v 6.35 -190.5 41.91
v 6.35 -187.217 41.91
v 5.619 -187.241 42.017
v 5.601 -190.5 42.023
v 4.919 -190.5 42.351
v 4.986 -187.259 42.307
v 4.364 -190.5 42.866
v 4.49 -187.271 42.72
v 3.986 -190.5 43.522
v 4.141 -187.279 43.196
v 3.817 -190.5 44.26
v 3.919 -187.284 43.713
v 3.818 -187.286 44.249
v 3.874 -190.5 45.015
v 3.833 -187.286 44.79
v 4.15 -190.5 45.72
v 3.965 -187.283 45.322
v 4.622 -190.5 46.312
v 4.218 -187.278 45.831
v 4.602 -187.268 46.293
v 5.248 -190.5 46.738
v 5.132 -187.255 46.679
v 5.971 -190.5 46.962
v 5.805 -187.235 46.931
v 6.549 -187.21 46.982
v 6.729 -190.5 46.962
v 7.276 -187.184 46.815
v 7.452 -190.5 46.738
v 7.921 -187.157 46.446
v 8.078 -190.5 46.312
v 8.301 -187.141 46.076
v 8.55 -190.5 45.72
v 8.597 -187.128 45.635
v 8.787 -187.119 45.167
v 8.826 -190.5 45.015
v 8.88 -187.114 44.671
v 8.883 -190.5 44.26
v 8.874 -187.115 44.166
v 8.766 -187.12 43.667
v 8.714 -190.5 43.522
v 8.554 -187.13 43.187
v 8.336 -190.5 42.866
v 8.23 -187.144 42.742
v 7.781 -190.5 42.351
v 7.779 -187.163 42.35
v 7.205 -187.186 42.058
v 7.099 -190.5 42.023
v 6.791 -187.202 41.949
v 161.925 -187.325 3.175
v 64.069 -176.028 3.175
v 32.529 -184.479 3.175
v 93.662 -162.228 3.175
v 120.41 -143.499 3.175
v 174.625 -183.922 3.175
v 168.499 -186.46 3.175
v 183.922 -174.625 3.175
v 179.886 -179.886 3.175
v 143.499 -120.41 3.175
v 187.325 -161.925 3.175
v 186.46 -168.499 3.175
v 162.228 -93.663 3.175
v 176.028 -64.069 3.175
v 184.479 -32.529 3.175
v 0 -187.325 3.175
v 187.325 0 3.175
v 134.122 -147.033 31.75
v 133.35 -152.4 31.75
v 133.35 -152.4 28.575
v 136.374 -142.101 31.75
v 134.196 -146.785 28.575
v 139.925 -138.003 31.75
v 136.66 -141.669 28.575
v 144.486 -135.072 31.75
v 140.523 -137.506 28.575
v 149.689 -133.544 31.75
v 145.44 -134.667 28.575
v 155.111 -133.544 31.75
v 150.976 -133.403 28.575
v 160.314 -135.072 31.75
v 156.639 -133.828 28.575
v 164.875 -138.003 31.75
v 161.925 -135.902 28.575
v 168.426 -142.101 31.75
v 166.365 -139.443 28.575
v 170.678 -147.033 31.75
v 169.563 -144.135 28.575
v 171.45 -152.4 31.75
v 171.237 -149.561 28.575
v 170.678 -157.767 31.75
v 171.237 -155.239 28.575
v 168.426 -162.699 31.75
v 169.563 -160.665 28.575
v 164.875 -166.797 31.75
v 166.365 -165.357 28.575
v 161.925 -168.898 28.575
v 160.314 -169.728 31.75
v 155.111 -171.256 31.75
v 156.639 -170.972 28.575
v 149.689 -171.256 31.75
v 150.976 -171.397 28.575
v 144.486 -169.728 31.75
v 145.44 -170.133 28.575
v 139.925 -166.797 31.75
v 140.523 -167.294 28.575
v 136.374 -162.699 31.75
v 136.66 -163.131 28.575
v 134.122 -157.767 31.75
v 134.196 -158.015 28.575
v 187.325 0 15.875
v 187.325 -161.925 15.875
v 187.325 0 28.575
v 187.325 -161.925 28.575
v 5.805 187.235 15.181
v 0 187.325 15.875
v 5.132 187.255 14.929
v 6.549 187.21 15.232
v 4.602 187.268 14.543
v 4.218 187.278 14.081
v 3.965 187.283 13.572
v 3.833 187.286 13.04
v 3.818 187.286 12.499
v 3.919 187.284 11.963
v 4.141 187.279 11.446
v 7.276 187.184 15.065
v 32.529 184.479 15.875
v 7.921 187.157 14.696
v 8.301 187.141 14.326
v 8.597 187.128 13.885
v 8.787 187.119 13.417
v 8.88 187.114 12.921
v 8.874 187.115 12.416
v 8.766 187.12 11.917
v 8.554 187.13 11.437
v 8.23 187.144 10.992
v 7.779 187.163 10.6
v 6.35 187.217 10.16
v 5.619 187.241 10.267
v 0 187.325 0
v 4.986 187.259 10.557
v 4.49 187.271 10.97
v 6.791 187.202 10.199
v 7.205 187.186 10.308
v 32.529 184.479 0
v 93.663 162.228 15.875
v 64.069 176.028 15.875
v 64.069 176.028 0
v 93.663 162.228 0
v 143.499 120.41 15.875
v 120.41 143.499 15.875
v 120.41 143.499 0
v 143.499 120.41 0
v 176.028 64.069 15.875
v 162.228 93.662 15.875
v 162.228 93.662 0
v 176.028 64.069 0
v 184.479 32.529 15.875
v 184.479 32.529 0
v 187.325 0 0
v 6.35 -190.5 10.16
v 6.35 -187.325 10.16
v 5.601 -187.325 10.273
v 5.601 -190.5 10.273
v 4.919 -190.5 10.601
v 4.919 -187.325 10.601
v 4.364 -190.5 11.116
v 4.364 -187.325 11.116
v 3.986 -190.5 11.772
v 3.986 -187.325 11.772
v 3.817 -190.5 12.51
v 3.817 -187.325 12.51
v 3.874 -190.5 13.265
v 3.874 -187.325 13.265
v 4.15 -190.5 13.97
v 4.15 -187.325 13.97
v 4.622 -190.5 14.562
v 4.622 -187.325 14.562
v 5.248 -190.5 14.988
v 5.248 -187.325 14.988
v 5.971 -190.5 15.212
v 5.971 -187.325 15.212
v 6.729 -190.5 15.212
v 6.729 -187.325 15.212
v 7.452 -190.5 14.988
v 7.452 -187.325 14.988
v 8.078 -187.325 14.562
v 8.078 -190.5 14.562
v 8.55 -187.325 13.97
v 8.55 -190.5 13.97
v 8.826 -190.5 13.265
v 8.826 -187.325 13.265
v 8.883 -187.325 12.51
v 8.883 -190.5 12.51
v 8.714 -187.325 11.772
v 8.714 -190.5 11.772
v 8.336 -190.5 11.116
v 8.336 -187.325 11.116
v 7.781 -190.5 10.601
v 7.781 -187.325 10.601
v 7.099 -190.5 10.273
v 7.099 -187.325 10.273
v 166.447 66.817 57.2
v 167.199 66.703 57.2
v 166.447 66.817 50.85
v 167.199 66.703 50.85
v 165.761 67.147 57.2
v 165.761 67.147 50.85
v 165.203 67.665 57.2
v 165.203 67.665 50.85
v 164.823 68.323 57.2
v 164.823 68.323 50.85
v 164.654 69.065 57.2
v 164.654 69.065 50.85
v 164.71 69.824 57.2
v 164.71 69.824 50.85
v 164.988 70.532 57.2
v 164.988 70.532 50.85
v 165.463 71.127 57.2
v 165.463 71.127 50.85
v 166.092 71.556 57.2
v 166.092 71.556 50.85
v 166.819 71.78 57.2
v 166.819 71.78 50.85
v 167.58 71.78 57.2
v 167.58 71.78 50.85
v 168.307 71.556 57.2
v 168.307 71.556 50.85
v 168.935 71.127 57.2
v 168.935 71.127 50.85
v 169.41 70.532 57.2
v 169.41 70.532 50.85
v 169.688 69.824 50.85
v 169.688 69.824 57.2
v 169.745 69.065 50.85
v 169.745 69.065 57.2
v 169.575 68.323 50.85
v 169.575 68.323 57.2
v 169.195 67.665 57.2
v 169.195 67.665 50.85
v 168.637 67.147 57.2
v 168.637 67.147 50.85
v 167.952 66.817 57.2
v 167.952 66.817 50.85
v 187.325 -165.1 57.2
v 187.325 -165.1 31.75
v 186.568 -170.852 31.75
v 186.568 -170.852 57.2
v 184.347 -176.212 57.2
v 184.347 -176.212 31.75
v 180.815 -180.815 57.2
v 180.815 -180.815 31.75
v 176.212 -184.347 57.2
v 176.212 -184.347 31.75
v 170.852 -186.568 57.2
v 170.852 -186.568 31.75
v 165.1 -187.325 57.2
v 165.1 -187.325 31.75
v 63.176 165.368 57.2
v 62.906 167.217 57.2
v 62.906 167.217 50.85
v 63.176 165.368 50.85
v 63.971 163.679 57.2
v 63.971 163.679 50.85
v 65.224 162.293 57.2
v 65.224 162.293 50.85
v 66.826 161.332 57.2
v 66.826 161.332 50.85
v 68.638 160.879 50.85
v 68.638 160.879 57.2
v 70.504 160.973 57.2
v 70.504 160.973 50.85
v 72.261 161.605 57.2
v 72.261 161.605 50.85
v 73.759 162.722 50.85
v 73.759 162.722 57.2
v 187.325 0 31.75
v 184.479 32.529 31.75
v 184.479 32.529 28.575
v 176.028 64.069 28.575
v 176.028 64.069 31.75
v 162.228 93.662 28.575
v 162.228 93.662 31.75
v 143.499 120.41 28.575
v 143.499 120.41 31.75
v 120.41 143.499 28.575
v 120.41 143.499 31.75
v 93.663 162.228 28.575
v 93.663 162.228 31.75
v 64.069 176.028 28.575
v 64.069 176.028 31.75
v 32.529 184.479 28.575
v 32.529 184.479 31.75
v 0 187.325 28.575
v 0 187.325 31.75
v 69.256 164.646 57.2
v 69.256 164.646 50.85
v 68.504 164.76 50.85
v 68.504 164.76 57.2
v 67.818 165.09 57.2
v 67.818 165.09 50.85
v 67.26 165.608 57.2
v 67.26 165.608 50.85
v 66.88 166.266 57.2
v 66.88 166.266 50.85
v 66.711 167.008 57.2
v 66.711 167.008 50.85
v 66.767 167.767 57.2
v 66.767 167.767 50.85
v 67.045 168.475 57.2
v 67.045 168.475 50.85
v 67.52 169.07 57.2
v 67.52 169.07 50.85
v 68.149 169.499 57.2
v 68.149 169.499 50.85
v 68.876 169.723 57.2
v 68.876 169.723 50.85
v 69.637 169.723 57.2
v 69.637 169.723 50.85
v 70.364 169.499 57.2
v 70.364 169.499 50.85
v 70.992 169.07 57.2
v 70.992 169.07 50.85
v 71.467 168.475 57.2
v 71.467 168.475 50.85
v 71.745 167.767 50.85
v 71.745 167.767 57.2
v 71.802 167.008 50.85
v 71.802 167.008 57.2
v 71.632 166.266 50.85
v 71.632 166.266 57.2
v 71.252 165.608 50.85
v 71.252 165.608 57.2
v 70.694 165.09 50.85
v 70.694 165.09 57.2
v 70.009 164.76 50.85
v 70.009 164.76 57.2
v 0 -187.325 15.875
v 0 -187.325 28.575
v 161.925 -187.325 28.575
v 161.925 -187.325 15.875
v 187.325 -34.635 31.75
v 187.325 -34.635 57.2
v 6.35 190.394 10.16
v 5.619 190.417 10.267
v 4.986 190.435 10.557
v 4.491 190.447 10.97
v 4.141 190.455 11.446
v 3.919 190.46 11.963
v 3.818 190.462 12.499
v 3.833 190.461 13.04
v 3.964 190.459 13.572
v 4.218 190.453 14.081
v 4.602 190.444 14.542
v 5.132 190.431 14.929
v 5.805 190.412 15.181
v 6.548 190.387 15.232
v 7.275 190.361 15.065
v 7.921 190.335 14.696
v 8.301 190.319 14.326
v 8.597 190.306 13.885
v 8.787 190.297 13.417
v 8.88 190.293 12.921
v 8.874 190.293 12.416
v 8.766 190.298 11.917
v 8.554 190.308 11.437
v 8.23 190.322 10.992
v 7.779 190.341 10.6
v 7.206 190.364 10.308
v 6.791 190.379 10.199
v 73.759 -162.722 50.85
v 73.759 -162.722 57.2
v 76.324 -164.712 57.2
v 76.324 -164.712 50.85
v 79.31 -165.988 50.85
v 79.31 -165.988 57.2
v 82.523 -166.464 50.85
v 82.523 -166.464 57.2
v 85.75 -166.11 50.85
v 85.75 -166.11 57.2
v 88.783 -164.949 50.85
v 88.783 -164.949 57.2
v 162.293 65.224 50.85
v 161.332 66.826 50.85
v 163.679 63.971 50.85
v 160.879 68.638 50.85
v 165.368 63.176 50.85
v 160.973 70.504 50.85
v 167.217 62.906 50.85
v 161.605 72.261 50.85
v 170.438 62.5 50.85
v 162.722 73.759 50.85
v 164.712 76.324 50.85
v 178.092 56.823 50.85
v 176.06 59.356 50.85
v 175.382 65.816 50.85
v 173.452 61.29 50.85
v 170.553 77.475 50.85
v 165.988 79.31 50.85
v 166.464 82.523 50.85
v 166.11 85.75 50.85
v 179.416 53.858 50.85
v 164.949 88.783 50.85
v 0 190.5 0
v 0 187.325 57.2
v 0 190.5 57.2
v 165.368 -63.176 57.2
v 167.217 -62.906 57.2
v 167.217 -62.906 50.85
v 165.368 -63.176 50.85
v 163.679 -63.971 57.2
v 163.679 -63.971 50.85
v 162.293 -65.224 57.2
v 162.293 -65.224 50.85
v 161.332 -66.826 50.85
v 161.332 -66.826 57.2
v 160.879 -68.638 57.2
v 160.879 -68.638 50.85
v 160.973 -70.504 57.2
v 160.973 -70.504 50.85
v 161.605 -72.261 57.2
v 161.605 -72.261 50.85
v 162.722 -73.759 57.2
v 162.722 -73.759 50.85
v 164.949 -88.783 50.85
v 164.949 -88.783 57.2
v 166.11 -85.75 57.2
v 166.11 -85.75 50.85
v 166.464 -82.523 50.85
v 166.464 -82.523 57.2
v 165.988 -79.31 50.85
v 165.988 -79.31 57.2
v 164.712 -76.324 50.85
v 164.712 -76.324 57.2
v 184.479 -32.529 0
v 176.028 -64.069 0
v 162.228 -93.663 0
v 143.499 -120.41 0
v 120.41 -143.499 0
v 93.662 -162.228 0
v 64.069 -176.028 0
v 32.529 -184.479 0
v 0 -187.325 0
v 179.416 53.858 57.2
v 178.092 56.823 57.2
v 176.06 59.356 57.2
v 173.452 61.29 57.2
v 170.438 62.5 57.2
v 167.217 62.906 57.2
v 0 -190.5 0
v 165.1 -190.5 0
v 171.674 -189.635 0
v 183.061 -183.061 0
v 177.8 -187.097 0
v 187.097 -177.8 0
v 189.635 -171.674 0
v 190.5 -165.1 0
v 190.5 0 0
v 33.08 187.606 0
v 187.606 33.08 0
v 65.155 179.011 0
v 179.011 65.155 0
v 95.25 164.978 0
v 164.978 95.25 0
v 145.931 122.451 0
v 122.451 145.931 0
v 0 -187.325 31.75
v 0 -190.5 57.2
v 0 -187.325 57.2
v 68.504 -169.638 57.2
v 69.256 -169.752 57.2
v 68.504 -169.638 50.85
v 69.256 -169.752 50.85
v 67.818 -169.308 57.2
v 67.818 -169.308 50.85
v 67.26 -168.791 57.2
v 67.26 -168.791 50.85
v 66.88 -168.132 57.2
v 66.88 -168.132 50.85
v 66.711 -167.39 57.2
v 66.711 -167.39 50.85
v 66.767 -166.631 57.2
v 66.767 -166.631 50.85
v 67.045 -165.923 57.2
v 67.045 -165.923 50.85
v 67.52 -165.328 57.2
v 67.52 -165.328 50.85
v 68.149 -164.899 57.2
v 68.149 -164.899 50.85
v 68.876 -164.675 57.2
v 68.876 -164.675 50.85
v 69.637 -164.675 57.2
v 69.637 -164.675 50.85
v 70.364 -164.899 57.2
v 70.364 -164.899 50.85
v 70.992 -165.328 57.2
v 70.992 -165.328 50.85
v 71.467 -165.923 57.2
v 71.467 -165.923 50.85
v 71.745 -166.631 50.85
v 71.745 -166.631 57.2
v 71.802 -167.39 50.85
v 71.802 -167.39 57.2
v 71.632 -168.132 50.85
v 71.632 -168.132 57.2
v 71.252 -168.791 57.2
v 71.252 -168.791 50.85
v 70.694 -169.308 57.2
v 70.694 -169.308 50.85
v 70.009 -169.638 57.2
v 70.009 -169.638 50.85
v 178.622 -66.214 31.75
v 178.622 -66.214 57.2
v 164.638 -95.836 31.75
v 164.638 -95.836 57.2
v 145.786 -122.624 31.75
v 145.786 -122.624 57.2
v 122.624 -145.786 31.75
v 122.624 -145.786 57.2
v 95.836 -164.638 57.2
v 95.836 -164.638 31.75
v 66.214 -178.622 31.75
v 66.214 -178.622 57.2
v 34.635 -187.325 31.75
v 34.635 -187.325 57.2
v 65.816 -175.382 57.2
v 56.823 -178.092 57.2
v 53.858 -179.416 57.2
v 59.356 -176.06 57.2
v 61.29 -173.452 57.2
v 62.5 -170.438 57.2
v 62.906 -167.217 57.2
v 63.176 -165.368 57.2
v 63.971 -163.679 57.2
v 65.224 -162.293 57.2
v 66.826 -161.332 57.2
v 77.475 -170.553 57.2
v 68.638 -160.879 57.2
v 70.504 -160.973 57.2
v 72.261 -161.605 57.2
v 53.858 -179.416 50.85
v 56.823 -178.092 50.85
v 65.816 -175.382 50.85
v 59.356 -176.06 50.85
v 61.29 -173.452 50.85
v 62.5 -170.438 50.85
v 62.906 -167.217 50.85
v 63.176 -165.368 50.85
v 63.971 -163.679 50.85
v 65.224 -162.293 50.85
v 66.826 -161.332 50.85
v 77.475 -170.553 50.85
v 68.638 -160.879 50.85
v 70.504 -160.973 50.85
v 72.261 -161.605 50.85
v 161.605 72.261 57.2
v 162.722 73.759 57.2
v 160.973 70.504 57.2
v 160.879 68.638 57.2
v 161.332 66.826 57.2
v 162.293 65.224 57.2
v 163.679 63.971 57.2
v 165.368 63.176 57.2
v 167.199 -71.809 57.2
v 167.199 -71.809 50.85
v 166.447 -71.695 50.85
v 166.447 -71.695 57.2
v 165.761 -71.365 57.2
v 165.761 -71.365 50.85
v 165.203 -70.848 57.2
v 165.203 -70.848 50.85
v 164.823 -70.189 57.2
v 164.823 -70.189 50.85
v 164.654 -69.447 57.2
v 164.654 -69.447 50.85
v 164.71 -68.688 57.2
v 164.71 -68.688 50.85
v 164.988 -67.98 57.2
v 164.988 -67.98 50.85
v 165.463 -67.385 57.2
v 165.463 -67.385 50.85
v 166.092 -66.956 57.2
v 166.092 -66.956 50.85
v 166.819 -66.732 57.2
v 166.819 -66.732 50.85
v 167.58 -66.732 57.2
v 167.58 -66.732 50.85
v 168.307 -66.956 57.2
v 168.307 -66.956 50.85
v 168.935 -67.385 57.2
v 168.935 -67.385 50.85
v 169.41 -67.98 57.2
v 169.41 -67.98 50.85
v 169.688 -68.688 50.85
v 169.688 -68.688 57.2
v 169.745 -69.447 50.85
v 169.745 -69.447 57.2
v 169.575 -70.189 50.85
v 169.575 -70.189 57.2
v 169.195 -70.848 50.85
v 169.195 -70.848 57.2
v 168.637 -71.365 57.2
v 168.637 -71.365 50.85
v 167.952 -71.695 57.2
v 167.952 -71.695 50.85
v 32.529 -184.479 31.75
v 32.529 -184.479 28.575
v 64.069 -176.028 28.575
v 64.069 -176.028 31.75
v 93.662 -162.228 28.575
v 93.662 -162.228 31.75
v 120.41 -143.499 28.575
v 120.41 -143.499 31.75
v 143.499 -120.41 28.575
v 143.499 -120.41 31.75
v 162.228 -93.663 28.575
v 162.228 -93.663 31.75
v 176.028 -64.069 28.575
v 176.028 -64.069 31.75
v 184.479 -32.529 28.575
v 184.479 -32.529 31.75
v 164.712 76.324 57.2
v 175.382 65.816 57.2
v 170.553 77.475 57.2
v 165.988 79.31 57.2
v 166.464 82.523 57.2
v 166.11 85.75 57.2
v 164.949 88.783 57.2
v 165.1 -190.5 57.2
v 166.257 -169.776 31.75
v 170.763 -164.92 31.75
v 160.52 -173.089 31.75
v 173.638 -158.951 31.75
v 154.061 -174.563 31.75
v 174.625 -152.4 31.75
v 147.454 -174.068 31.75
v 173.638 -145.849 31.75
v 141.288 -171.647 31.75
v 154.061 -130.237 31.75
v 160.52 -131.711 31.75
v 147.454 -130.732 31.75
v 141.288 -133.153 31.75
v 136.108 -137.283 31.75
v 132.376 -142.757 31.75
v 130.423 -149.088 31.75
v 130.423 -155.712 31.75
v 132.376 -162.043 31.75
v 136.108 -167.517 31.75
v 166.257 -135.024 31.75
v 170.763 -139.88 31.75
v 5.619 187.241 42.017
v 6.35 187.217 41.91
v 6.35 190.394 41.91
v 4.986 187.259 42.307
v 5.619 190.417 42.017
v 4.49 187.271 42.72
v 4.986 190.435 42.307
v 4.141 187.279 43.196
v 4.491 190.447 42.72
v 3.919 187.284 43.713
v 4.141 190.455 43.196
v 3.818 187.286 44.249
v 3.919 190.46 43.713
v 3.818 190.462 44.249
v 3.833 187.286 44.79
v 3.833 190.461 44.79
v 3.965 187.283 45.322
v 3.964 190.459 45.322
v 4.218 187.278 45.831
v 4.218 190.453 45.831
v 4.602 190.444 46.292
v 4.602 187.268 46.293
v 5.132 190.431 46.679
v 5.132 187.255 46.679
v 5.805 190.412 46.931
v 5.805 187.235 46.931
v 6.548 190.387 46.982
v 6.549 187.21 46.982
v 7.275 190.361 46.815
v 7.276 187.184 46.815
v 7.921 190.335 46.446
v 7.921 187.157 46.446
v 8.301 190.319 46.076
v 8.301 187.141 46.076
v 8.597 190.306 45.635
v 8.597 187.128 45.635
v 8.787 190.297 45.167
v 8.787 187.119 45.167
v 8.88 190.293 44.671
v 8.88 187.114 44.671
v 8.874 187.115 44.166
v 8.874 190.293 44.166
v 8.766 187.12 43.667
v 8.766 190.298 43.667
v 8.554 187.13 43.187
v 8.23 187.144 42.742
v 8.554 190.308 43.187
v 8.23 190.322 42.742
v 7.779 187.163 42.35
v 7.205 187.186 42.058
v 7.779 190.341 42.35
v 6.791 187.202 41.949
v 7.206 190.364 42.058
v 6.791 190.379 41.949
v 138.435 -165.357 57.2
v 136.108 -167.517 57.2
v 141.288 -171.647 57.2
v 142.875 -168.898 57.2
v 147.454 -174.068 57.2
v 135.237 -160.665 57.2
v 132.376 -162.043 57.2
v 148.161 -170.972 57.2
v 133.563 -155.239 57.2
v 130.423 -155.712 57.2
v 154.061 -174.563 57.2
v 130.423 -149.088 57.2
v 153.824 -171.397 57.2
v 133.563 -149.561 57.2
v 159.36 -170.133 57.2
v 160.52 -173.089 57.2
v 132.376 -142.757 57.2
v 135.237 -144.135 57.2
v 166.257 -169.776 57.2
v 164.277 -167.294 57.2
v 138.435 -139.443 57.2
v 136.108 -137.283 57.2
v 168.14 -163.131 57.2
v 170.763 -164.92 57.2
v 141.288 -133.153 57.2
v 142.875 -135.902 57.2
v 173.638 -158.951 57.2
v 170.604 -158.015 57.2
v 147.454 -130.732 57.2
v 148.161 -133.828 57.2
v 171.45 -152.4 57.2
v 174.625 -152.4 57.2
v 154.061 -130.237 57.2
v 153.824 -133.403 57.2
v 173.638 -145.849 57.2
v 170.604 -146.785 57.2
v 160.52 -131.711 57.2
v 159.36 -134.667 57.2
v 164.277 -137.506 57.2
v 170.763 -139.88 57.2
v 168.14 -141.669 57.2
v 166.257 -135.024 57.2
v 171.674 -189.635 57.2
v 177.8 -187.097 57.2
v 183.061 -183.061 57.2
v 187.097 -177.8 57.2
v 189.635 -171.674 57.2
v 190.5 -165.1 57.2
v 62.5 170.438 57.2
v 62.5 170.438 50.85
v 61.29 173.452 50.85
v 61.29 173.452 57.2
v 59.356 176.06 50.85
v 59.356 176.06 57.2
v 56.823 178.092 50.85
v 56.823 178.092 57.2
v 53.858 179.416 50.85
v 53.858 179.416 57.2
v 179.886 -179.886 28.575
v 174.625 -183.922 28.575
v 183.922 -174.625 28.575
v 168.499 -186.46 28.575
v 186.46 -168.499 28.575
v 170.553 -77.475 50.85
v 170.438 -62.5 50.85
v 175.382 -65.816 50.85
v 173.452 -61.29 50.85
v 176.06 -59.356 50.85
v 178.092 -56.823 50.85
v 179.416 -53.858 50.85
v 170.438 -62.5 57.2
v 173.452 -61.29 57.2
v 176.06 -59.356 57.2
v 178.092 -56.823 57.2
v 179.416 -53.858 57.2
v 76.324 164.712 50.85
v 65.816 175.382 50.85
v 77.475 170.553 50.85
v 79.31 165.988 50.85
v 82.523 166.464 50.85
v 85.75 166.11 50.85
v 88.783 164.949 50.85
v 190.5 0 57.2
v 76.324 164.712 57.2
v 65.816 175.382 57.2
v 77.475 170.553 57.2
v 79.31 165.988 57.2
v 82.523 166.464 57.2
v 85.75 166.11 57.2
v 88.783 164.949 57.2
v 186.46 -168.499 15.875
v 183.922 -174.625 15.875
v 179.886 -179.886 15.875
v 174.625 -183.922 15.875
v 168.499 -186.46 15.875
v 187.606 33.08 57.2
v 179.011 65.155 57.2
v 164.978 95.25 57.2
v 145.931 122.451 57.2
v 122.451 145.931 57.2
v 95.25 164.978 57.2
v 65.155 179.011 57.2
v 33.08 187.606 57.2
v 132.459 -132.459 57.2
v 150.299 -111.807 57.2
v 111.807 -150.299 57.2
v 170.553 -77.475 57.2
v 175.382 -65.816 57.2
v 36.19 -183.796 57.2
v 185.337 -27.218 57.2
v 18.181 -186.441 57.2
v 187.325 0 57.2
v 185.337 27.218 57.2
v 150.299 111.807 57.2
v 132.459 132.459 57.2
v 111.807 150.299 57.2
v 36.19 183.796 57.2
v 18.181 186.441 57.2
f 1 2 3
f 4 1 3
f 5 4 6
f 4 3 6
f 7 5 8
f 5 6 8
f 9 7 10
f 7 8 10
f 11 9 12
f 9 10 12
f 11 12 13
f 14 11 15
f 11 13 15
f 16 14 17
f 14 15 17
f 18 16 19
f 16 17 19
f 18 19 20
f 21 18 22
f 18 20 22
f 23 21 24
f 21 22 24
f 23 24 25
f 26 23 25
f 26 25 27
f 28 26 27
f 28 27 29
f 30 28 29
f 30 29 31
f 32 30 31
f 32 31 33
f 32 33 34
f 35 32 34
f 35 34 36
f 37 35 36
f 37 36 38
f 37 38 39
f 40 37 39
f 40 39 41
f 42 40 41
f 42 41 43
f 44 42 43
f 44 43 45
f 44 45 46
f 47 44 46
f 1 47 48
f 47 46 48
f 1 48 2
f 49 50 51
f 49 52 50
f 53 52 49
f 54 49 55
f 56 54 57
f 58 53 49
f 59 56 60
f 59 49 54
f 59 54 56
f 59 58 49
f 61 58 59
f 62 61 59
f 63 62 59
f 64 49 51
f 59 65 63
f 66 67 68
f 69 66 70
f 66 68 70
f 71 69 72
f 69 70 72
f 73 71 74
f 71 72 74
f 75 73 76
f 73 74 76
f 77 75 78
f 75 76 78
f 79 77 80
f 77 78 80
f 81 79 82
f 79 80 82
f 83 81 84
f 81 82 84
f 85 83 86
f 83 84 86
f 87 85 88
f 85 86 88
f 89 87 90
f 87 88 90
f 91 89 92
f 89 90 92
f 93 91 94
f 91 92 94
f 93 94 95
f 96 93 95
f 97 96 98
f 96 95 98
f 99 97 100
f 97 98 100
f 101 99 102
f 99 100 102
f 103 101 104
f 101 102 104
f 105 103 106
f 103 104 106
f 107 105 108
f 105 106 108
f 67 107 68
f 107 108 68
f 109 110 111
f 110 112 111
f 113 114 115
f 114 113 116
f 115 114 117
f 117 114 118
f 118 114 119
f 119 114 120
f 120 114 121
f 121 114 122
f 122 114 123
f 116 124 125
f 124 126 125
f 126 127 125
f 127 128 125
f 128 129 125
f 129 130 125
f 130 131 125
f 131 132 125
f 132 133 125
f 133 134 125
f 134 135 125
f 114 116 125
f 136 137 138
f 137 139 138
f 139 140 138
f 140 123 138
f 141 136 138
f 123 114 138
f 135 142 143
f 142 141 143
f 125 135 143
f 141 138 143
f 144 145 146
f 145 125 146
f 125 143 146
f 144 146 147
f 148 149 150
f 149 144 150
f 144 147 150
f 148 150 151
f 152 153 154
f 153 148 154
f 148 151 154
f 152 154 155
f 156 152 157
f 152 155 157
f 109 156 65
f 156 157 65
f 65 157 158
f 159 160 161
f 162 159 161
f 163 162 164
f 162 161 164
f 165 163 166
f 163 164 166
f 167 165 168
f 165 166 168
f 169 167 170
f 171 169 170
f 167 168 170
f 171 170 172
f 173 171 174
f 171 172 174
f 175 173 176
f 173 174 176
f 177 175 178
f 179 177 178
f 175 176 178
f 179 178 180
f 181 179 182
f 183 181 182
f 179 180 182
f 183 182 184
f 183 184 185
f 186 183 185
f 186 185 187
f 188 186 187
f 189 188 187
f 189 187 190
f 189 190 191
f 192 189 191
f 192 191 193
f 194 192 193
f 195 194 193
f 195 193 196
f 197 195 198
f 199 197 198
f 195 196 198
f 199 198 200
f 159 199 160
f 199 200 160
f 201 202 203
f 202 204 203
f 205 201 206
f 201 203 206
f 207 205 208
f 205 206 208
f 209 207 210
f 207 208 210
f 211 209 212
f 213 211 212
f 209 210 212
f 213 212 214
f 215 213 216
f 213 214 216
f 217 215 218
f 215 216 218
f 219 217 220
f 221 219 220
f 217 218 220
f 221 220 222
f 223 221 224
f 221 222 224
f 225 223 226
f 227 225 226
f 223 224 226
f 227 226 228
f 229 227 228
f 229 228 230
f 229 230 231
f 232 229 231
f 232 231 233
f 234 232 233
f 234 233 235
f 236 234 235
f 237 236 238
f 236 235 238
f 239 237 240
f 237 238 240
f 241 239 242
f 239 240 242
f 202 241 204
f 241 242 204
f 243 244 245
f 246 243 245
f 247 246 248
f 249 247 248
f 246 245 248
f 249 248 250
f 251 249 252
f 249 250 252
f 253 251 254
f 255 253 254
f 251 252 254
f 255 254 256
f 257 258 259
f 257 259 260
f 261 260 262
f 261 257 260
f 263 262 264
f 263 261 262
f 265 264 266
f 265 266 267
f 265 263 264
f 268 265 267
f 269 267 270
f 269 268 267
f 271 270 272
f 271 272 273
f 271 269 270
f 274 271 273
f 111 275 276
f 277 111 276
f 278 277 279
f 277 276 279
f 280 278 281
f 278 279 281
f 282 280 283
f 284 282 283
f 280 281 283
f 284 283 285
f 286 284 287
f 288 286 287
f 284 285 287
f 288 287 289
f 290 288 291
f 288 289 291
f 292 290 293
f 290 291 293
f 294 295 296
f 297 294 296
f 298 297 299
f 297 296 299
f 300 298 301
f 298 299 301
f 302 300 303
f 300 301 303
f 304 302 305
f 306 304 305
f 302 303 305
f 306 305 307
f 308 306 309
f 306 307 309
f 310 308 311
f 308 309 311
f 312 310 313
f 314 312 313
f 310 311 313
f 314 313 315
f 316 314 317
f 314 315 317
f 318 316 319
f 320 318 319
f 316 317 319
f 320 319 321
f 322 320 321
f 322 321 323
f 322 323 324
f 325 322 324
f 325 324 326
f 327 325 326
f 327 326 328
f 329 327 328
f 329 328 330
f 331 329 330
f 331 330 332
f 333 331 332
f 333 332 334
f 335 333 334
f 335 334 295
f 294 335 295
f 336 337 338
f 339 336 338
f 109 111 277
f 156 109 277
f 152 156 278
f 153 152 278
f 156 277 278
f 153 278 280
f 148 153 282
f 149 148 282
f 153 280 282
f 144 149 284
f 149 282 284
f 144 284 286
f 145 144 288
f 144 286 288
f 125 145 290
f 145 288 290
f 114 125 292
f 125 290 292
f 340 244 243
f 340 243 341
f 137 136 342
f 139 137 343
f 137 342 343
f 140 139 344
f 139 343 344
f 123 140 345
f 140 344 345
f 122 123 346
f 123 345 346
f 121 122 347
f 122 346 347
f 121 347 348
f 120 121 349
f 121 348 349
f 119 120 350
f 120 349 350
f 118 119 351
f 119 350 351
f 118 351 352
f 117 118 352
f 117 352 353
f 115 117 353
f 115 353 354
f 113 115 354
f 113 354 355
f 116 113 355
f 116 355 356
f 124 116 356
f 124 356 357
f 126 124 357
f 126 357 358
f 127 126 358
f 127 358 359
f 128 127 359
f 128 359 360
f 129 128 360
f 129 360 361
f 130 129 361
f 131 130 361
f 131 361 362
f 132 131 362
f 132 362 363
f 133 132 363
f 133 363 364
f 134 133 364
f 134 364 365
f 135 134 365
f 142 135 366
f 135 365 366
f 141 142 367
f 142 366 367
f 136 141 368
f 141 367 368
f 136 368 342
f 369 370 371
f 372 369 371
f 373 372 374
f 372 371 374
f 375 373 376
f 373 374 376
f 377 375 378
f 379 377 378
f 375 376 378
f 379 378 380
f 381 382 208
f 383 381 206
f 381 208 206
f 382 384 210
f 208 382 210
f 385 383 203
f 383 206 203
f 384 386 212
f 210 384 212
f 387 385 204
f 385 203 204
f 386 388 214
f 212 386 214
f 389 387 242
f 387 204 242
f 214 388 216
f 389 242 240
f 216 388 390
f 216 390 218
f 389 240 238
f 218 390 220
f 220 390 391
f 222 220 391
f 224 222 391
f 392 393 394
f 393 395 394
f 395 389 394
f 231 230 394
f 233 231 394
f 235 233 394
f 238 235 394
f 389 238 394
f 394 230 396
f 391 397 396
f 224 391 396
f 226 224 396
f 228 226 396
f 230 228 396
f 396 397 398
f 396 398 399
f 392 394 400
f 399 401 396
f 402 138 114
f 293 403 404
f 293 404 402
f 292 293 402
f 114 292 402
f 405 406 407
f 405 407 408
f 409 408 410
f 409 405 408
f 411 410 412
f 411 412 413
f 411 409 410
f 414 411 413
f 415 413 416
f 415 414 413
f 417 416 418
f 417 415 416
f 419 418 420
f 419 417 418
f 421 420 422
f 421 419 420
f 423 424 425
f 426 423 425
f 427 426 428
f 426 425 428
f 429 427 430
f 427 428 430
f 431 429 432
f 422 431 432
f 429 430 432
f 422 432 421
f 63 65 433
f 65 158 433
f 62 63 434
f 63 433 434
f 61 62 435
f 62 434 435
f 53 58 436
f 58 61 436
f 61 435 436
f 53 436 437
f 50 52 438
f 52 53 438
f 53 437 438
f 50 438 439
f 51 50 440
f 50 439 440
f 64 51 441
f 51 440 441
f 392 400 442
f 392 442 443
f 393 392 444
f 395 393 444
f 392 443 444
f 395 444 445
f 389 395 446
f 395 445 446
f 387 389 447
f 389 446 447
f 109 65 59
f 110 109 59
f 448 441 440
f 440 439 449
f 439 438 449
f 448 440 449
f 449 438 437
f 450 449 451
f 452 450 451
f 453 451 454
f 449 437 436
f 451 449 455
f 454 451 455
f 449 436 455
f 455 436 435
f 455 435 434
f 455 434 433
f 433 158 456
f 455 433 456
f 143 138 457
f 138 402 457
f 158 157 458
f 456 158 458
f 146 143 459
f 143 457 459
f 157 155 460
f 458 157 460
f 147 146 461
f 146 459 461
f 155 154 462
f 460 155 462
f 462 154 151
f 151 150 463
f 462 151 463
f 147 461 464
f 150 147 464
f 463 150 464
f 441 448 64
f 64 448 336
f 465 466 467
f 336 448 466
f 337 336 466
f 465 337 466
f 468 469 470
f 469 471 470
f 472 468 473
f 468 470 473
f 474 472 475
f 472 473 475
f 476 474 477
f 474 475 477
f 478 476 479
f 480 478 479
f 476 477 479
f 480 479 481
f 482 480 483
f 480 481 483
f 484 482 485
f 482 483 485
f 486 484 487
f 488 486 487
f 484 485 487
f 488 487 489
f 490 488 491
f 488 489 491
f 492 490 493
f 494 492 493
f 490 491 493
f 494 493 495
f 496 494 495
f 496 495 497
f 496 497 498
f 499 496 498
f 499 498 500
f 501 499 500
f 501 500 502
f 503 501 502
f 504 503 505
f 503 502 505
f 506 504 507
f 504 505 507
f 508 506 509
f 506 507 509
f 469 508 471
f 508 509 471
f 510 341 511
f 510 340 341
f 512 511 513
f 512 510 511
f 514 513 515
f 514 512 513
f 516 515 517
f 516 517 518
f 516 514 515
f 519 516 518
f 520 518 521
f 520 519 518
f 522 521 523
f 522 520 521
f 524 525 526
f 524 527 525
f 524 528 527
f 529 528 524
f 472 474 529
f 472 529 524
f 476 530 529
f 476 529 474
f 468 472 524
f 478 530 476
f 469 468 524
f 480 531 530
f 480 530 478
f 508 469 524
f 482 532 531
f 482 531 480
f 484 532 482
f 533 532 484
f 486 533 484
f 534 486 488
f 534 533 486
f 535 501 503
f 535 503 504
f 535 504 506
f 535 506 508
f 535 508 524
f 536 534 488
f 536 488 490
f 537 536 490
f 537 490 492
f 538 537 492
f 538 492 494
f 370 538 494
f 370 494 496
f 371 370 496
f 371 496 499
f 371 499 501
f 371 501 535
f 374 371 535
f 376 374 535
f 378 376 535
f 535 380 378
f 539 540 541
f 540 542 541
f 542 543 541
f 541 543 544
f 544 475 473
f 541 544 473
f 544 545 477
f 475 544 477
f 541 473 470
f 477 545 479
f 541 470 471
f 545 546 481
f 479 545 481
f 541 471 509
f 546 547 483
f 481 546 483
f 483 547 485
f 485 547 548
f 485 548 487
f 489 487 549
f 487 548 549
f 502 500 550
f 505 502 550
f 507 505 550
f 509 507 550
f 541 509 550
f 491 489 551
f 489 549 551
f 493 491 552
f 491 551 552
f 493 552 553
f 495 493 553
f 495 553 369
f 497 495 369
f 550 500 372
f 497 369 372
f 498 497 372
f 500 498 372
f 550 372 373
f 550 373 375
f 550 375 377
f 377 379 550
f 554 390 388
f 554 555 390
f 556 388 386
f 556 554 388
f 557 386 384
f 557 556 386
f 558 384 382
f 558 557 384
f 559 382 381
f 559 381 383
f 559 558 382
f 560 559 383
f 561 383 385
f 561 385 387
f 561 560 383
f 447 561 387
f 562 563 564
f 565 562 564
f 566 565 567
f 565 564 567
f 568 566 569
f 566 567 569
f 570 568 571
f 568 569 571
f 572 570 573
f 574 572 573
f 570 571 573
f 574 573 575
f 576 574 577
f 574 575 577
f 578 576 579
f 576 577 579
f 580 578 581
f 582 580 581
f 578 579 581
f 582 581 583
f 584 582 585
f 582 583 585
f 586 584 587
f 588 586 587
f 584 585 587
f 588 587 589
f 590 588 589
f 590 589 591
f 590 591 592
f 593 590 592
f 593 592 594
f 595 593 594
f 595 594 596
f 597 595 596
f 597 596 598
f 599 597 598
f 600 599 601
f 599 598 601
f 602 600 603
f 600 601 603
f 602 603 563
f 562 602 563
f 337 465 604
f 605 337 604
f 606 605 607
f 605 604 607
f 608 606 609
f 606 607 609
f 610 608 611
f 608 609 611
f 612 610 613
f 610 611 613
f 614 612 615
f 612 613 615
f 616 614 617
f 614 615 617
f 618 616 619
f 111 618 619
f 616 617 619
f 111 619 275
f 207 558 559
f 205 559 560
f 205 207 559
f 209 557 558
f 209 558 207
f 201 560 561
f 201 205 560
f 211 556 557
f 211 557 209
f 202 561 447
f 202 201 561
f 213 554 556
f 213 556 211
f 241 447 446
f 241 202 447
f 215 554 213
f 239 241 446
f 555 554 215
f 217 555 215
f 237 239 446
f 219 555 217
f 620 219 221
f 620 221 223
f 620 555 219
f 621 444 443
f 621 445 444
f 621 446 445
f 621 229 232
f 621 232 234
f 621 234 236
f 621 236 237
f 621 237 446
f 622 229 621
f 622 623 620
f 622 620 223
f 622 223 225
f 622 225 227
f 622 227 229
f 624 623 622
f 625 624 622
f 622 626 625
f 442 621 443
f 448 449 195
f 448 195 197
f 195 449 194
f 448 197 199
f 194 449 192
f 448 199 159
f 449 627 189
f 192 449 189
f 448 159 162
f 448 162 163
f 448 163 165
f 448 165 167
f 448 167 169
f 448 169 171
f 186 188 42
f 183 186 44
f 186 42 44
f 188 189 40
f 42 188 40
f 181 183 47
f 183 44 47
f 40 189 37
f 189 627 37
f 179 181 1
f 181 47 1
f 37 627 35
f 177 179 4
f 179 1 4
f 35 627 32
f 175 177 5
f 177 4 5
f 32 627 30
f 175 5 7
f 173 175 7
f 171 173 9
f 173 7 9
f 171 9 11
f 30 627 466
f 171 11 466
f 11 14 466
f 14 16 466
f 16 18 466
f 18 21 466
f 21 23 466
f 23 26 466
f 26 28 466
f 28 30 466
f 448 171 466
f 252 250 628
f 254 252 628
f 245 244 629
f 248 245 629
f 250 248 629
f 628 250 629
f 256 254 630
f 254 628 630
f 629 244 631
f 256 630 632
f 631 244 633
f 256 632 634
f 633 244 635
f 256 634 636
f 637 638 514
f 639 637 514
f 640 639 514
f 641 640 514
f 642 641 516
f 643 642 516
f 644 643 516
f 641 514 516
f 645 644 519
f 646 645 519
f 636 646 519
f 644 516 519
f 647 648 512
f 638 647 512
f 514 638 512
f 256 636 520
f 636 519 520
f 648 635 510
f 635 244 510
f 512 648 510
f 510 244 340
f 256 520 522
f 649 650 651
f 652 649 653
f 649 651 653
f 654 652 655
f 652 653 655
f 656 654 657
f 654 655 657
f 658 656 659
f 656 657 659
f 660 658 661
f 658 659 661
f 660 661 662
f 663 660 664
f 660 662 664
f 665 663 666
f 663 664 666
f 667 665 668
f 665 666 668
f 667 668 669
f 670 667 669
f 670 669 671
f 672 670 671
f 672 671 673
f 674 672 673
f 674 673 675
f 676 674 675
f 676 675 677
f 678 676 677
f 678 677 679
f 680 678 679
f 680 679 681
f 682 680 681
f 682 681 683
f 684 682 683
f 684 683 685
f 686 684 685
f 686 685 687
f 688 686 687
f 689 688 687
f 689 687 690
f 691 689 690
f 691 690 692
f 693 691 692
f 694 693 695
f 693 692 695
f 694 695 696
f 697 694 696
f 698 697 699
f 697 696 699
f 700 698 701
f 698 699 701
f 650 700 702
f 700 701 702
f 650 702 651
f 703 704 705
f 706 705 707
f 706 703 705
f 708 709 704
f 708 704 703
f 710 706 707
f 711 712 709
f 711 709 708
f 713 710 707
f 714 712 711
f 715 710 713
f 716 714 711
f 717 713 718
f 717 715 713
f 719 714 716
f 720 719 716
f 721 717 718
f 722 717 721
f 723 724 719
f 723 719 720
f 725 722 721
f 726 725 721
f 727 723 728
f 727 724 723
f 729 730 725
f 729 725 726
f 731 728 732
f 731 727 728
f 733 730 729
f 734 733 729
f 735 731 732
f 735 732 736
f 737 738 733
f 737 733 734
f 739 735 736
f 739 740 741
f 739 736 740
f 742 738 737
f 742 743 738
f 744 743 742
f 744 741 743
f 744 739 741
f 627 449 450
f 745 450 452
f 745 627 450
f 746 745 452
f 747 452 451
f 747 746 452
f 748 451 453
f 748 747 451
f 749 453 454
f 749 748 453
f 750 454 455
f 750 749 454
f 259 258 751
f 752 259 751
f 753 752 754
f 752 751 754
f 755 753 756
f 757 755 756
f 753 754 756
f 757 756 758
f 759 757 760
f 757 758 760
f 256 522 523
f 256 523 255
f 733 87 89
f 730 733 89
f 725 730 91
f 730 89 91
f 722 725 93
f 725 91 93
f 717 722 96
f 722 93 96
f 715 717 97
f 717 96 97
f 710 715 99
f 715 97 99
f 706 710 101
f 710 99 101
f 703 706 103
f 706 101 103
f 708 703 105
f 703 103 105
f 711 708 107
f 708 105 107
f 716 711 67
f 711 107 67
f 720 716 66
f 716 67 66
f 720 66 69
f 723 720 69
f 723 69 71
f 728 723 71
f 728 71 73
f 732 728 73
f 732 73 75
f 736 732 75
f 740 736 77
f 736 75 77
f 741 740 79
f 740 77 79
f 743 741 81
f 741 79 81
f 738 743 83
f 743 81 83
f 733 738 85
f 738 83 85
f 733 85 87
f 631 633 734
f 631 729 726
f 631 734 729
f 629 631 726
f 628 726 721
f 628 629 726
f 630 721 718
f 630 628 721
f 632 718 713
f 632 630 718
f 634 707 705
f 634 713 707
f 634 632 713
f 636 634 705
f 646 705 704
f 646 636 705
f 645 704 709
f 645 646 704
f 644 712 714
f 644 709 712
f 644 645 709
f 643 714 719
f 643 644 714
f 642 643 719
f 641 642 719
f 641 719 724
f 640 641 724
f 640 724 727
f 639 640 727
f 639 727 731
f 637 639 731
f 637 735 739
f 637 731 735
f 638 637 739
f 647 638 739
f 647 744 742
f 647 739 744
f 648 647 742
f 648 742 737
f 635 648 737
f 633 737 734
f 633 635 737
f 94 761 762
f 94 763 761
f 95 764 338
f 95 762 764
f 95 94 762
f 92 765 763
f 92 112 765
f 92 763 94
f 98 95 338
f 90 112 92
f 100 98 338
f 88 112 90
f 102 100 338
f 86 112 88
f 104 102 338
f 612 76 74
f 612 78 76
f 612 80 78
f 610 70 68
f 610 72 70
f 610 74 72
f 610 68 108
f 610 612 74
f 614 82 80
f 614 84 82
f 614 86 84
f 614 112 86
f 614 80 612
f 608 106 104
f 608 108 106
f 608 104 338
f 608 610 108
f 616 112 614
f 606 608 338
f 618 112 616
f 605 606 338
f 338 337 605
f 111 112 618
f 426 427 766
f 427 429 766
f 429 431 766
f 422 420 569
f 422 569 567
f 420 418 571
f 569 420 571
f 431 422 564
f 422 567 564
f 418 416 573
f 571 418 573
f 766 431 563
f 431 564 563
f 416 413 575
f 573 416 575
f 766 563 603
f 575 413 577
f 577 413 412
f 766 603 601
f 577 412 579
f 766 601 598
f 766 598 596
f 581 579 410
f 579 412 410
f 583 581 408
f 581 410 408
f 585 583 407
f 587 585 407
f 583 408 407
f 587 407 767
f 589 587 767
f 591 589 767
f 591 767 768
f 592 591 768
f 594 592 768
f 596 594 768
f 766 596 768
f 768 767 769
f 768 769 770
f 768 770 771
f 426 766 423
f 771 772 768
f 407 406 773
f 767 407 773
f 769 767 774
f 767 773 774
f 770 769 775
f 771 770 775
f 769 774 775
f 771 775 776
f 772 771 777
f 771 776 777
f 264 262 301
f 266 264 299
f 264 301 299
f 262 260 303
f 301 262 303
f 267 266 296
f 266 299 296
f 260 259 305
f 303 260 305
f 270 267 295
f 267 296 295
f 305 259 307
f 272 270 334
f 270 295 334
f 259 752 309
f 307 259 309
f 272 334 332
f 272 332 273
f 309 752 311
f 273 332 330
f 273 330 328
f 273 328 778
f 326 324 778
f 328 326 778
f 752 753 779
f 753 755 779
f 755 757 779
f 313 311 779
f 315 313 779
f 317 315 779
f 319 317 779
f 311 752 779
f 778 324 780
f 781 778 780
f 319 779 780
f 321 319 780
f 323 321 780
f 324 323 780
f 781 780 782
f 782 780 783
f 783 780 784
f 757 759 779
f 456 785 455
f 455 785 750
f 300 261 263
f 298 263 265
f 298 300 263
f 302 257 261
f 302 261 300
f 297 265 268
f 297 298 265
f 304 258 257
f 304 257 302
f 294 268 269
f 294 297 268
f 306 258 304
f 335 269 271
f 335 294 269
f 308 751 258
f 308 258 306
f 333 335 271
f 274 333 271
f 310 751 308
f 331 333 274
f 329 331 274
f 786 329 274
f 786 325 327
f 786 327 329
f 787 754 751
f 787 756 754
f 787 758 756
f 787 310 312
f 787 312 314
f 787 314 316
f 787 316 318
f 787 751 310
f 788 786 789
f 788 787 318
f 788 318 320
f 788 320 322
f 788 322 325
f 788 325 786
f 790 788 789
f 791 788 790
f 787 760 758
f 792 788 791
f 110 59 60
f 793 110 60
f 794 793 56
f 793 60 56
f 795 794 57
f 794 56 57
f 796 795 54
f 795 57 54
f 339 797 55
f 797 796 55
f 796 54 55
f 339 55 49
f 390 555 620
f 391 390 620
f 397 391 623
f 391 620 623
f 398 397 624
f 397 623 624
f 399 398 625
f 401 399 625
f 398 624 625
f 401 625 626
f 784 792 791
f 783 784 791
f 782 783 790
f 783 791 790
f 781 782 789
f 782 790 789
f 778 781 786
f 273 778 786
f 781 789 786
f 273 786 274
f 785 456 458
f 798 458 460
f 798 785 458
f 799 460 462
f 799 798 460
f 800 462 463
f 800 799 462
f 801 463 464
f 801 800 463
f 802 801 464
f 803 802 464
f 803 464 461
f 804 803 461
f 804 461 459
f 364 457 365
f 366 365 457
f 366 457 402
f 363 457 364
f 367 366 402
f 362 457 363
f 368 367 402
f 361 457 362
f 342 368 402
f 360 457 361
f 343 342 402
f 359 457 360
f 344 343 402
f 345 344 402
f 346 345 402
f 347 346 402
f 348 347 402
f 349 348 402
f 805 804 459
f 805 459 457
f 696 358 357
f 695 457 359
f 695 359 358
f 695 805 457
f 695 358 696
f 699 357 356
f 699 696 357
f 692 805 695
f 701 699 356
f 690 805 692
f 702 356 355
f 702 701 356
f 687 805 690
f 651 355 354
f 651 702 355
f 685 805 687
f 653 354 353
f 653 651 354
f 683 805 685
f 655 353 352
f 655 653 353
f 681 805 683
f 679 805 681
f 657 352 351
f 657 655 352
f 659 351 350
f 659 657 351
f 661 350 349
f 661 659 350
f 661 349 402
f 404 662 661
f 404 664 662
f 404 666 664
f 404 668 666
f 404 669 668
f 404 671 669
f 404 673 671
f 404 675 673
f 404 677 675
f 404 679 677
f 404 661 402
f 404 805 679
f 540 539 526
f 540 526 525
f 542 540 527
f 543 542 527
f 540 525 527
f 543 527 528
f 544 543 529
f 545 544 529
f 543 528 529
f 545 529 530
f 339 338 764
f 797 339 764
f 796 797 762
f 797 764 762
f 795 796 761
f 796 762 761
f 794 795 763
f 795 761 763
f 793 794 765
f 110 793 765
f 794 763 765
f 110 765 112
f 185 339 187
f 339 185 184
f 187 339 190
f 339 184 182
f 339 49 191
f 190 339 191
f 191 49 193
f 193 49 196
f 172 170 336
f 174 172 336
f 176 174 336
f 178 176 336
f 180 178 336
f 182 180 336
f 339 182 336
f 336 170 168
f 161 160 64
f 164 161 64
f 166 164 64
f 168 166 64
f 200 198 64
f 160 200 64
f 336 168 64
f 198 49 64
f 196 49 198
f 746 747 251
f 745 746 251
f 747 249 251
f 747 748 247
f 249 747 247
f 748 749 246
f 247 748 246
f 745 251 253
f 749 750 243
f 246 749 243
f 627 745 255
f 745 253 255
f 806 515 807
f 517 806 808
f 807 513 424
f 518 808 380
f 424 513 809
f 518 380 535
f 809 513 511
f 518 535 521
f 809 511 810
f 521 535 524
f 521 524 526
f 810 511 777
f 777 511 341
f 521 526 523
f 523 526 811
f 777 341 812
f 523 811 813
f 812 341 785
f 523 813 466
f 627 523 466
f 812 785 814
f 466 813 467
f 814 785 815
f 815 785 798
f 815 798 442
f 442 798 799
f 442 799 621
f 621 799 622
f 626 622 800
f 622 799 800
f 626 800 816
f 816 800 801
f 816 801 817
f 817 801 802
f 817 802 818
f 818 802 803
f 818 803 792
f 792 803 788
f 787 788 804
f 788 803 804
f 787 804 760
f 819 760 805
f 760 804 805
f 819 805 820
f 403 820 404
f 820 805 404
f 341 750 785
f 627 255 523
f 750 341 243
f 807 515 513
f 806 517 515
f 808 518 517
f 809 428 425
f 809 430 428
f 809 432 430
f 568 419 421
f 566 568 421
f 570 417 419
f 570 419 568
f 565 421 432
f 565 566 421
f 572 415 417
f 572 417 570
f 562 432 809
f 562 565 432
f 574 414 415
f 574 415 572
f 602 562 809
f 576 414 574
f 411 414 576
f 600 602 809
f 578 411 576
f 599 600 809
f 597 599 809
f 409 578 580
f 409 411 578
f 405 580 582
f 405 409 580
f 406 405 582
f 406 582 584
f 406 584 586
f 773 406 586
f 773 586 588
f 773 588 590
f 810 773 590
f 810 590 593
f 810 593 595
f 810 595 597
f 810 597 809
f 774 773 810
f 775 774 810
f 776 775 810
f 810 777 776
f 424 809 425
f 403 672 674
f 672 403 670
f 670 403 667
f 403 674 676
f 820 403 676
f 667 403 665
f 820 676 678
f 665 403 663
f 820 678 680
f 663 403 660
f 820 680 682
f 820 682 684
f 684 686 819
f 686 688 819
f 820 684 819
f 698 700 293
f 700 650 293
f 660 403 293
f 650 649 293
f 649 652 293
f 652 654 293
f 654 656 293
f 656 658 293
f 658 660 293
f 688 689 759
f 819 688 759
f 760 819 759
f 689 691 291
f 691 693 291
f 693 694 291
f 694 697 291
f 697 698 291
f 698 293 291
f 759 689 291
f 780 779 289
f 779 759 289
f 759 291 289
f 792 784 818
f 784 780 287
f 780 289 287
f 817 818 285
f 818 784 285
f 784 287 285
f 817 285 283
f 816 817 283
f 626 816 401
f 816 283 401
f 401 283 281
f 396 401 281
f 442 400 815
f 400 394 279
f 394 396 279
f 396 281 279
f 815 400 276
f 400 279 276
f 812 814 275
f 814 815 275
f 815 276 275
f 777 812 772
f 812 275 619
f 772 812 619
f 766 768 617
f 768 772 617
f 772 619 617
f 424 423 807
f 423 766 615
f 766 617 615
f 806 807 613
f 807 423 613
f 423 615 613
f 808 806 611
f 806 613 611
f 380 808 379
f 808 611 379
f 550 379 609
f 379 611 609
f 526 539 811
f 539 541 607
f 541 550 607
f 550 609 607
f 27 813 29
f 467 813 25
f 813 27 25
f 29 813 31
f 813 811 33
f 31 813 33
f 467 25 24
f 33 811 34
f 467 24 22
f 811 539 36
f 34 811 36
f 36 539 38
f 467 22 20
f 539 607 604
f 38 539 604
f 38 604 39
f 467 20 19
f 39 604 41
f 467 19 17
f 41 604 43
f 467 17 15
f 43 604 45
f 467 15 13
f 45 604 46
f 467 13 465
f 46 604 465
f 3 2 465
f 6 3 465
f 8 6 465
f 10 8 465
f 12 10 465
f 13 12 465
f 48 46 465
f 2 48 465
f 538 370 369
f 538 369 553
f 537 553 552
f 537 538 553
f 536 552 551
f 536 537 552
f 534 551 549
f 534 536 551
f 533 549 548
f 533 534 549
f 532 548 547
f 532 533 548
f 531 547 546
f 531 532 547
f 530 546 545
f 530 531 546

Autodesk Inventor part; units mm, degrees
ref_plane "YZ Plane" through (0, 0, 0) normal (1, 0, 0) x (0, 1, 0)
ref_plane "XZ Plane" through (0, 0, 0) normal (0, 1, 0) x (-1, 0, 0)
ref_plane "XY Plane" through (0, 0, 0) normal (0, 0, 1) x (1, 0, 0)
sketch "Sketch1" plane through (0, 0, 0) normal (0, 0, 1) x (1, 0, 0)
  arc A0 (190.5, 0) -> (-190.5, 0) centre (0, 0) ccw
  circle A1 centre (0, 0) radius 187.325
  line L0 (-190.5, 0) -> (-190.5, -165.1)
  line L1 (-165.1, -190.5) -> (165.1, -190.5)
  line L2 (190.5, -165.1) -> (190.5, 0)
  arc A2 (-190.5, -165.1) -> (-165.1, -190.5) centre (-165.1, -165.1) ccw
  arc A3 (165.1, -190.5) -> (190.5, -165.1) centre (165.1, -165.1) ccw
  dimension "d0" = 381
  dimension "d1" = 3.175
  dimension "d2" = 25.4
extrude "Extrusion1" add sketch "Sketch1" along normal blind 3.175
sketch "Sketch2" plane through (0, 0, 3.175) normal (0, 0, 1) x (1, 0, 0)
  line L0 (-190.5, 0) -> (-190.5, -165.1) projected
  arc A0 (-190.5, -165.1) -> (-165.1, -190.5) centre (-165.1, -165.1) ccw projected
  line L1 (-165.1, -190.5) -> (165.1, -190.5) projected
  arc A1 (165.1, -190.5) -> (190.5, -165.1) centre (165.1, -165.1) ccw projected
  line L2 (190.5, -165.1) -> (190.5, 0) projected
  arc A2 (190.5, 0) -> (-190.5, 0) centre (0, 0) ccw projected
  circle A3 centre (0, 0) radius 187.325 projected
  line L3 (-187.325, 0) -> (-187.325, -161.925)
  line L4 (187.325, 0) -> (187.325, -161.925)
  line L5 (161.925, -187.325) -> (-161.925, -187.325)
  circle A4 centre (0, 0) radius 187.325 projected
  arc A5 (-187.325, -161.925) -> (-161.925, -187.325) centre (-161.925, -161.925) ccw
  arc A6 (161.925, -187.325) -> (187.325, -161.925) centre (161.925, -161.925) ccw
  dimension "d5" = 25.4
extrude "Extrusion2" add sketch "Sketch2" along normal blind 12.7
mirror "Mirror1" about plane through (0, 0, 15.875) normal (0, 0, 1) of "Extrusion1", "Extrusion2"
sketch "Sketch3" plane through (0, 0, 31.75) normal (0, 0, 1) x (1, 0, 0)
  point P0 (0, 0)
sketch "Sketch4" plane through (0, 0, 31.75) normal (0, 0, -1) x (-1, 0, 0)
  line L0 (190.5, 0) -> (190.5, -165.1) projected
  arc A0 (190.5, 0) -> (-190.5, 0) centre (0, 0) ccw projected
  line L1 (-190.5, -165.1) -> (-190.5, 0) projected
  arc A1 (-190.5, -165.1) -> (-165.1, -190.5) centre (-165.1, -165.1) ccw projected
  line L2 (165.1, -190.5) -> (-165.1, -190.5) projected
  arc A2 (165.1, -190.5) -> (190.5, -165.1) centre (165.1, -165.1) ccw projected
  circle A3 centre (0, 0) radius 187.325 projected
  arc A4 (-187.325, -165.1) -> (-165.1, -187.325) centre (-165.1, -165.1) ccw
  line L3 (-187.325, -165.1) -> (-187.325, 0)
  arc A5 (187.325, 0) -> (-187.325, 0) centre (0, 0) ccw
  line L4 (187.325, 0) -> (187.325, -165.1)
  arc A6 (165.1, -187.325) -> (187.325, -165.1) centre (165.1, -165.1) ccw
  line L5 (165.1, -187.325) -> (-165.1, -187.325)
  circle A7 centre (0, 0) radius 190.5
  point P0 (-34.6352, -187.325)
  point P1 (-187.325, -34.6352)
  point P2 (34.6352, -187.325)
  point P3 (187.325, -34.6352)
  dimension "d8" = 3.175
  dimension "d9" = 3.175
extrude "Extrusion3" add sketch "Sketch4" against normal blind 25.4504 contours A7 L4 A3 L3 A0 | L0 A2 L2 A7 L5 A6 L4 | A7 L3 A4 L5 L2 A1 L1 | A7 L5 A3 L4 | L3 A3 L5 A7 | A7 L5
sketch "Sketch5" plane through (161.925, -187.325, 28.575) normal (0, 0, -1) x (-1, 0, 0)
  circle A0 centre (9.525, 34.925) radius 19.05
  point P0 (161.925, 187.325)
  dimension "d12" = 38.1
  dimension "d13" = 152.4
  dimension "d14" = 152.4
extrude "Extrusion4" cut sketch "Sketch5" against normal through all
sketch "Sketch6" plane through (34.6352, -187.325, 31.75) normal (0, 0, 1) x (1, 0, 0)
  circle A0 centre (117.7648, 34.925) radius 19.05 projected
  circle A1 centre (117.7648, 34.925) radius 19.05
  circle A2 centre (117.7648, 34.925) radius 22.225
  point P0 (-34.6352, 187.325)
  dimension "d17" = 3.175
extrude "Extrusion5" add sketch "Sketch6" along normal up to surface (25.4504 mm away)
sketch "Sketch7" plane through (0, 0, 0) normal (1, 0, 0) x (0, 1, 0)
  line L0 (-211.2628, -72.6551) -> (211.2628, -72.6551)
  line L1 (211.2628, -72.6551) -> (211.2628, 72.6551)
  line L2 (211.2628, 72.6551) -> (-211.2628, 72.6551)
  line L3 (-211.2628, 72.6551) -> (-211.2628, -72.6551)
  line L4 (-211.2628, -72.6551) -> (211.2628, 72.6551) construction
  line L5 (211.2628, -72.6551) -> (-211.2628, 72.6551) construction
  point P0 (0, 0)
extrude "Extrusion6" cut sketch "Sketch7" against normal through all
sketch "Sketch8" plane through (165.1, -190.5, 0) normal (0, -1, 0) x (1, 0, 0)
  line L0 (-165.1, 0) -> (0, 0) projected
  line L1 (-165.1, 57.2004) -> (-165.1, 0) projected
  point P0 (-158.75, 12.7)
  point P1 (-158.75, 44.45)
  dimension "d22" = 12.7
  dimension "d23" = 31.75
  dimension "d24" = 6.35
hole "Hole1" at (6.35, -190.5, 44.45) at (6.35, -190.5, 12.7) direction (0, 1, 0) diameter 5.08 end through all
sketch "Sketch9" plane through (0, 0, 57.2004) normal (0, 0, 1) x (1, 0, 0)
  arc A0 (0, -187.325) -> (187.325, 0) centre (0, 0) ccw projected
  line L0 (69.2561, -167.1991) -> (0, 0) construction
  line L1 (-45.2243, 0) -> (271.3455, 0) projected
  line L2 (0, 0) -> (0, -221.1499)
  circle A1 centre (69.2561, -167.1991) radius 6.35
  arc A2 (73.7587, -162.7215) -> (66.8261, -161.3325) centre (69.2561, -167.1991) ccw
  arc A3 (66.8261, -161.3325) -> (62.9062, -167.2167) centre (69.2561, -167.1991) ccw
  arc A4 (73.7587, -162.7215) -> (88.7831, -164.9492) centre (82.7639, -153.7662) ccw
  arc A5 (53.8576, -179.4158) -> (62.9062, -167.2167) centre (50.2062, -167.252) ccw
  arc A6 (0, -187.325) -> (0, 187.325) centre (0, 0) ccw projected
  circle A7 centre (167.1991, -69.2561) radius 6.35
  arc A8 (164.9492, -88.7831) -> (162.7215, -73.7587) centre (153.7662, -82.7639) ccw
  arc A9 (167.2167, -62.9062) -> (179.4158, -53.8576) centre (167.252, -50.2062) ccw
  circle A10 centre (167.1991, 69.2561) radius 6.35
  arc A11 (179.4158, 53.8576) -> (167.2167, 62.9062) centre (167.252, 50.2062) ccw
  arc A12 (162.7215, 73.7587) -> (164.9492, 88.7831) centre (153.7662, 82.7639) ccw
  circle A13 centre (69.2561, 167.1991) radius 6.35
  arc A14 (88.7831, 164.9492) -> (73.7587, 162.7215) centre (82.7639, 153.7662) ccw
  arc A15 (62.9062, 167.2167) -> (53.8576, 179.4158) centre (50.2062, 167.252) ccw
  circle A16 centre (-69.2561, 167.1991) radius 6.35
  arc A17 (-53.8576, 179.4158) -> (-62.9062, 167.2167) centre (-50.2062, 167.252) ccw
  arc A18 (-73.7587, 162.7215) -> (-88.7831, 164.9492) centre (-82.7639, 153.7662) ccw
  circle A19 centre (-167.1991, 69.2561) radius 6.35
  arc A20 (-164.9492, 88.7831) -> (-162.7215, 73.7587) centre (-153.7662, 82.7639) ccw
  arc A21 (-167.2167, 62.9062) -> (-179.4158, 53.8576) centre (-167.252, 50.2062) ccw
  circle A22 centre (-167.1991, -69.2561) radius 6.35
  arc A23 (-179.4158, -53.8576) -> (-167.2167, -62.9062) centre (-167.252, -50.2062) ccw
  arc A24 (-162.7215, -73.7587) -> (-164.9492, -88.7831) centre (-153.7662, -82.7639) ccw
  circle A25 centre (-69.2561, -167.1991) radius 6.35
  arc A26 (-88.7831, -164.9492) -> (-73.7587, -162.7215) centre (-82.7639, -153.7662) ccw
  arc A27 (-62.9062, -167.2167) -> (-53.8576, -179.4158) centre (-50.2062, -167.252) ccw
  point P0 (161.3325, -66.8261)
  point P1 (161.3325, 66.8261)
  point P2 (66.8261, 161.3325)
  point P3 (-66.8261, 161.3325)
  point P4 (-161.3325, 66.8261)
  point P5 (-161.3325, -66.8261)
  point P6 (-66.8261, -161.3325)
  point P7 (179.4158, -53.8576)
  dimension "d32" = 180.975
  dimension "d38" = 12.7
  dimension "d39" = 67.5
  dimension "d40" = 12.7
  dimension "d43" = 360
extrude "Extrusion7" add sketch "Sketch9" against normal blind 6.35 contours A14 A13 A6 | A11 A10 A6 | A5 A1 A0 | A1 A4 A0 | A1 | A0 A7 A9 | A8 A7 A0 | A7 | A10 A12 A6 | A10 | A13 A15 A6 | A13
hole "Hole2" at (69.2561, -167.1991, 57.2004) at (167.1991, 69.2561, 57.2004) at (69.2561, 167.1991, 57.2004) at (167.1991, -69.2561, 57.2004) direction (0, 0, -1) diameter 5.1054 end through all clearance for "Flat Head Machine Screw (82)" size "#10" standard "Ansi Unified Screw Threads"
properties part number "3DPRINT,CABLE-SHROUD,OUTER"
